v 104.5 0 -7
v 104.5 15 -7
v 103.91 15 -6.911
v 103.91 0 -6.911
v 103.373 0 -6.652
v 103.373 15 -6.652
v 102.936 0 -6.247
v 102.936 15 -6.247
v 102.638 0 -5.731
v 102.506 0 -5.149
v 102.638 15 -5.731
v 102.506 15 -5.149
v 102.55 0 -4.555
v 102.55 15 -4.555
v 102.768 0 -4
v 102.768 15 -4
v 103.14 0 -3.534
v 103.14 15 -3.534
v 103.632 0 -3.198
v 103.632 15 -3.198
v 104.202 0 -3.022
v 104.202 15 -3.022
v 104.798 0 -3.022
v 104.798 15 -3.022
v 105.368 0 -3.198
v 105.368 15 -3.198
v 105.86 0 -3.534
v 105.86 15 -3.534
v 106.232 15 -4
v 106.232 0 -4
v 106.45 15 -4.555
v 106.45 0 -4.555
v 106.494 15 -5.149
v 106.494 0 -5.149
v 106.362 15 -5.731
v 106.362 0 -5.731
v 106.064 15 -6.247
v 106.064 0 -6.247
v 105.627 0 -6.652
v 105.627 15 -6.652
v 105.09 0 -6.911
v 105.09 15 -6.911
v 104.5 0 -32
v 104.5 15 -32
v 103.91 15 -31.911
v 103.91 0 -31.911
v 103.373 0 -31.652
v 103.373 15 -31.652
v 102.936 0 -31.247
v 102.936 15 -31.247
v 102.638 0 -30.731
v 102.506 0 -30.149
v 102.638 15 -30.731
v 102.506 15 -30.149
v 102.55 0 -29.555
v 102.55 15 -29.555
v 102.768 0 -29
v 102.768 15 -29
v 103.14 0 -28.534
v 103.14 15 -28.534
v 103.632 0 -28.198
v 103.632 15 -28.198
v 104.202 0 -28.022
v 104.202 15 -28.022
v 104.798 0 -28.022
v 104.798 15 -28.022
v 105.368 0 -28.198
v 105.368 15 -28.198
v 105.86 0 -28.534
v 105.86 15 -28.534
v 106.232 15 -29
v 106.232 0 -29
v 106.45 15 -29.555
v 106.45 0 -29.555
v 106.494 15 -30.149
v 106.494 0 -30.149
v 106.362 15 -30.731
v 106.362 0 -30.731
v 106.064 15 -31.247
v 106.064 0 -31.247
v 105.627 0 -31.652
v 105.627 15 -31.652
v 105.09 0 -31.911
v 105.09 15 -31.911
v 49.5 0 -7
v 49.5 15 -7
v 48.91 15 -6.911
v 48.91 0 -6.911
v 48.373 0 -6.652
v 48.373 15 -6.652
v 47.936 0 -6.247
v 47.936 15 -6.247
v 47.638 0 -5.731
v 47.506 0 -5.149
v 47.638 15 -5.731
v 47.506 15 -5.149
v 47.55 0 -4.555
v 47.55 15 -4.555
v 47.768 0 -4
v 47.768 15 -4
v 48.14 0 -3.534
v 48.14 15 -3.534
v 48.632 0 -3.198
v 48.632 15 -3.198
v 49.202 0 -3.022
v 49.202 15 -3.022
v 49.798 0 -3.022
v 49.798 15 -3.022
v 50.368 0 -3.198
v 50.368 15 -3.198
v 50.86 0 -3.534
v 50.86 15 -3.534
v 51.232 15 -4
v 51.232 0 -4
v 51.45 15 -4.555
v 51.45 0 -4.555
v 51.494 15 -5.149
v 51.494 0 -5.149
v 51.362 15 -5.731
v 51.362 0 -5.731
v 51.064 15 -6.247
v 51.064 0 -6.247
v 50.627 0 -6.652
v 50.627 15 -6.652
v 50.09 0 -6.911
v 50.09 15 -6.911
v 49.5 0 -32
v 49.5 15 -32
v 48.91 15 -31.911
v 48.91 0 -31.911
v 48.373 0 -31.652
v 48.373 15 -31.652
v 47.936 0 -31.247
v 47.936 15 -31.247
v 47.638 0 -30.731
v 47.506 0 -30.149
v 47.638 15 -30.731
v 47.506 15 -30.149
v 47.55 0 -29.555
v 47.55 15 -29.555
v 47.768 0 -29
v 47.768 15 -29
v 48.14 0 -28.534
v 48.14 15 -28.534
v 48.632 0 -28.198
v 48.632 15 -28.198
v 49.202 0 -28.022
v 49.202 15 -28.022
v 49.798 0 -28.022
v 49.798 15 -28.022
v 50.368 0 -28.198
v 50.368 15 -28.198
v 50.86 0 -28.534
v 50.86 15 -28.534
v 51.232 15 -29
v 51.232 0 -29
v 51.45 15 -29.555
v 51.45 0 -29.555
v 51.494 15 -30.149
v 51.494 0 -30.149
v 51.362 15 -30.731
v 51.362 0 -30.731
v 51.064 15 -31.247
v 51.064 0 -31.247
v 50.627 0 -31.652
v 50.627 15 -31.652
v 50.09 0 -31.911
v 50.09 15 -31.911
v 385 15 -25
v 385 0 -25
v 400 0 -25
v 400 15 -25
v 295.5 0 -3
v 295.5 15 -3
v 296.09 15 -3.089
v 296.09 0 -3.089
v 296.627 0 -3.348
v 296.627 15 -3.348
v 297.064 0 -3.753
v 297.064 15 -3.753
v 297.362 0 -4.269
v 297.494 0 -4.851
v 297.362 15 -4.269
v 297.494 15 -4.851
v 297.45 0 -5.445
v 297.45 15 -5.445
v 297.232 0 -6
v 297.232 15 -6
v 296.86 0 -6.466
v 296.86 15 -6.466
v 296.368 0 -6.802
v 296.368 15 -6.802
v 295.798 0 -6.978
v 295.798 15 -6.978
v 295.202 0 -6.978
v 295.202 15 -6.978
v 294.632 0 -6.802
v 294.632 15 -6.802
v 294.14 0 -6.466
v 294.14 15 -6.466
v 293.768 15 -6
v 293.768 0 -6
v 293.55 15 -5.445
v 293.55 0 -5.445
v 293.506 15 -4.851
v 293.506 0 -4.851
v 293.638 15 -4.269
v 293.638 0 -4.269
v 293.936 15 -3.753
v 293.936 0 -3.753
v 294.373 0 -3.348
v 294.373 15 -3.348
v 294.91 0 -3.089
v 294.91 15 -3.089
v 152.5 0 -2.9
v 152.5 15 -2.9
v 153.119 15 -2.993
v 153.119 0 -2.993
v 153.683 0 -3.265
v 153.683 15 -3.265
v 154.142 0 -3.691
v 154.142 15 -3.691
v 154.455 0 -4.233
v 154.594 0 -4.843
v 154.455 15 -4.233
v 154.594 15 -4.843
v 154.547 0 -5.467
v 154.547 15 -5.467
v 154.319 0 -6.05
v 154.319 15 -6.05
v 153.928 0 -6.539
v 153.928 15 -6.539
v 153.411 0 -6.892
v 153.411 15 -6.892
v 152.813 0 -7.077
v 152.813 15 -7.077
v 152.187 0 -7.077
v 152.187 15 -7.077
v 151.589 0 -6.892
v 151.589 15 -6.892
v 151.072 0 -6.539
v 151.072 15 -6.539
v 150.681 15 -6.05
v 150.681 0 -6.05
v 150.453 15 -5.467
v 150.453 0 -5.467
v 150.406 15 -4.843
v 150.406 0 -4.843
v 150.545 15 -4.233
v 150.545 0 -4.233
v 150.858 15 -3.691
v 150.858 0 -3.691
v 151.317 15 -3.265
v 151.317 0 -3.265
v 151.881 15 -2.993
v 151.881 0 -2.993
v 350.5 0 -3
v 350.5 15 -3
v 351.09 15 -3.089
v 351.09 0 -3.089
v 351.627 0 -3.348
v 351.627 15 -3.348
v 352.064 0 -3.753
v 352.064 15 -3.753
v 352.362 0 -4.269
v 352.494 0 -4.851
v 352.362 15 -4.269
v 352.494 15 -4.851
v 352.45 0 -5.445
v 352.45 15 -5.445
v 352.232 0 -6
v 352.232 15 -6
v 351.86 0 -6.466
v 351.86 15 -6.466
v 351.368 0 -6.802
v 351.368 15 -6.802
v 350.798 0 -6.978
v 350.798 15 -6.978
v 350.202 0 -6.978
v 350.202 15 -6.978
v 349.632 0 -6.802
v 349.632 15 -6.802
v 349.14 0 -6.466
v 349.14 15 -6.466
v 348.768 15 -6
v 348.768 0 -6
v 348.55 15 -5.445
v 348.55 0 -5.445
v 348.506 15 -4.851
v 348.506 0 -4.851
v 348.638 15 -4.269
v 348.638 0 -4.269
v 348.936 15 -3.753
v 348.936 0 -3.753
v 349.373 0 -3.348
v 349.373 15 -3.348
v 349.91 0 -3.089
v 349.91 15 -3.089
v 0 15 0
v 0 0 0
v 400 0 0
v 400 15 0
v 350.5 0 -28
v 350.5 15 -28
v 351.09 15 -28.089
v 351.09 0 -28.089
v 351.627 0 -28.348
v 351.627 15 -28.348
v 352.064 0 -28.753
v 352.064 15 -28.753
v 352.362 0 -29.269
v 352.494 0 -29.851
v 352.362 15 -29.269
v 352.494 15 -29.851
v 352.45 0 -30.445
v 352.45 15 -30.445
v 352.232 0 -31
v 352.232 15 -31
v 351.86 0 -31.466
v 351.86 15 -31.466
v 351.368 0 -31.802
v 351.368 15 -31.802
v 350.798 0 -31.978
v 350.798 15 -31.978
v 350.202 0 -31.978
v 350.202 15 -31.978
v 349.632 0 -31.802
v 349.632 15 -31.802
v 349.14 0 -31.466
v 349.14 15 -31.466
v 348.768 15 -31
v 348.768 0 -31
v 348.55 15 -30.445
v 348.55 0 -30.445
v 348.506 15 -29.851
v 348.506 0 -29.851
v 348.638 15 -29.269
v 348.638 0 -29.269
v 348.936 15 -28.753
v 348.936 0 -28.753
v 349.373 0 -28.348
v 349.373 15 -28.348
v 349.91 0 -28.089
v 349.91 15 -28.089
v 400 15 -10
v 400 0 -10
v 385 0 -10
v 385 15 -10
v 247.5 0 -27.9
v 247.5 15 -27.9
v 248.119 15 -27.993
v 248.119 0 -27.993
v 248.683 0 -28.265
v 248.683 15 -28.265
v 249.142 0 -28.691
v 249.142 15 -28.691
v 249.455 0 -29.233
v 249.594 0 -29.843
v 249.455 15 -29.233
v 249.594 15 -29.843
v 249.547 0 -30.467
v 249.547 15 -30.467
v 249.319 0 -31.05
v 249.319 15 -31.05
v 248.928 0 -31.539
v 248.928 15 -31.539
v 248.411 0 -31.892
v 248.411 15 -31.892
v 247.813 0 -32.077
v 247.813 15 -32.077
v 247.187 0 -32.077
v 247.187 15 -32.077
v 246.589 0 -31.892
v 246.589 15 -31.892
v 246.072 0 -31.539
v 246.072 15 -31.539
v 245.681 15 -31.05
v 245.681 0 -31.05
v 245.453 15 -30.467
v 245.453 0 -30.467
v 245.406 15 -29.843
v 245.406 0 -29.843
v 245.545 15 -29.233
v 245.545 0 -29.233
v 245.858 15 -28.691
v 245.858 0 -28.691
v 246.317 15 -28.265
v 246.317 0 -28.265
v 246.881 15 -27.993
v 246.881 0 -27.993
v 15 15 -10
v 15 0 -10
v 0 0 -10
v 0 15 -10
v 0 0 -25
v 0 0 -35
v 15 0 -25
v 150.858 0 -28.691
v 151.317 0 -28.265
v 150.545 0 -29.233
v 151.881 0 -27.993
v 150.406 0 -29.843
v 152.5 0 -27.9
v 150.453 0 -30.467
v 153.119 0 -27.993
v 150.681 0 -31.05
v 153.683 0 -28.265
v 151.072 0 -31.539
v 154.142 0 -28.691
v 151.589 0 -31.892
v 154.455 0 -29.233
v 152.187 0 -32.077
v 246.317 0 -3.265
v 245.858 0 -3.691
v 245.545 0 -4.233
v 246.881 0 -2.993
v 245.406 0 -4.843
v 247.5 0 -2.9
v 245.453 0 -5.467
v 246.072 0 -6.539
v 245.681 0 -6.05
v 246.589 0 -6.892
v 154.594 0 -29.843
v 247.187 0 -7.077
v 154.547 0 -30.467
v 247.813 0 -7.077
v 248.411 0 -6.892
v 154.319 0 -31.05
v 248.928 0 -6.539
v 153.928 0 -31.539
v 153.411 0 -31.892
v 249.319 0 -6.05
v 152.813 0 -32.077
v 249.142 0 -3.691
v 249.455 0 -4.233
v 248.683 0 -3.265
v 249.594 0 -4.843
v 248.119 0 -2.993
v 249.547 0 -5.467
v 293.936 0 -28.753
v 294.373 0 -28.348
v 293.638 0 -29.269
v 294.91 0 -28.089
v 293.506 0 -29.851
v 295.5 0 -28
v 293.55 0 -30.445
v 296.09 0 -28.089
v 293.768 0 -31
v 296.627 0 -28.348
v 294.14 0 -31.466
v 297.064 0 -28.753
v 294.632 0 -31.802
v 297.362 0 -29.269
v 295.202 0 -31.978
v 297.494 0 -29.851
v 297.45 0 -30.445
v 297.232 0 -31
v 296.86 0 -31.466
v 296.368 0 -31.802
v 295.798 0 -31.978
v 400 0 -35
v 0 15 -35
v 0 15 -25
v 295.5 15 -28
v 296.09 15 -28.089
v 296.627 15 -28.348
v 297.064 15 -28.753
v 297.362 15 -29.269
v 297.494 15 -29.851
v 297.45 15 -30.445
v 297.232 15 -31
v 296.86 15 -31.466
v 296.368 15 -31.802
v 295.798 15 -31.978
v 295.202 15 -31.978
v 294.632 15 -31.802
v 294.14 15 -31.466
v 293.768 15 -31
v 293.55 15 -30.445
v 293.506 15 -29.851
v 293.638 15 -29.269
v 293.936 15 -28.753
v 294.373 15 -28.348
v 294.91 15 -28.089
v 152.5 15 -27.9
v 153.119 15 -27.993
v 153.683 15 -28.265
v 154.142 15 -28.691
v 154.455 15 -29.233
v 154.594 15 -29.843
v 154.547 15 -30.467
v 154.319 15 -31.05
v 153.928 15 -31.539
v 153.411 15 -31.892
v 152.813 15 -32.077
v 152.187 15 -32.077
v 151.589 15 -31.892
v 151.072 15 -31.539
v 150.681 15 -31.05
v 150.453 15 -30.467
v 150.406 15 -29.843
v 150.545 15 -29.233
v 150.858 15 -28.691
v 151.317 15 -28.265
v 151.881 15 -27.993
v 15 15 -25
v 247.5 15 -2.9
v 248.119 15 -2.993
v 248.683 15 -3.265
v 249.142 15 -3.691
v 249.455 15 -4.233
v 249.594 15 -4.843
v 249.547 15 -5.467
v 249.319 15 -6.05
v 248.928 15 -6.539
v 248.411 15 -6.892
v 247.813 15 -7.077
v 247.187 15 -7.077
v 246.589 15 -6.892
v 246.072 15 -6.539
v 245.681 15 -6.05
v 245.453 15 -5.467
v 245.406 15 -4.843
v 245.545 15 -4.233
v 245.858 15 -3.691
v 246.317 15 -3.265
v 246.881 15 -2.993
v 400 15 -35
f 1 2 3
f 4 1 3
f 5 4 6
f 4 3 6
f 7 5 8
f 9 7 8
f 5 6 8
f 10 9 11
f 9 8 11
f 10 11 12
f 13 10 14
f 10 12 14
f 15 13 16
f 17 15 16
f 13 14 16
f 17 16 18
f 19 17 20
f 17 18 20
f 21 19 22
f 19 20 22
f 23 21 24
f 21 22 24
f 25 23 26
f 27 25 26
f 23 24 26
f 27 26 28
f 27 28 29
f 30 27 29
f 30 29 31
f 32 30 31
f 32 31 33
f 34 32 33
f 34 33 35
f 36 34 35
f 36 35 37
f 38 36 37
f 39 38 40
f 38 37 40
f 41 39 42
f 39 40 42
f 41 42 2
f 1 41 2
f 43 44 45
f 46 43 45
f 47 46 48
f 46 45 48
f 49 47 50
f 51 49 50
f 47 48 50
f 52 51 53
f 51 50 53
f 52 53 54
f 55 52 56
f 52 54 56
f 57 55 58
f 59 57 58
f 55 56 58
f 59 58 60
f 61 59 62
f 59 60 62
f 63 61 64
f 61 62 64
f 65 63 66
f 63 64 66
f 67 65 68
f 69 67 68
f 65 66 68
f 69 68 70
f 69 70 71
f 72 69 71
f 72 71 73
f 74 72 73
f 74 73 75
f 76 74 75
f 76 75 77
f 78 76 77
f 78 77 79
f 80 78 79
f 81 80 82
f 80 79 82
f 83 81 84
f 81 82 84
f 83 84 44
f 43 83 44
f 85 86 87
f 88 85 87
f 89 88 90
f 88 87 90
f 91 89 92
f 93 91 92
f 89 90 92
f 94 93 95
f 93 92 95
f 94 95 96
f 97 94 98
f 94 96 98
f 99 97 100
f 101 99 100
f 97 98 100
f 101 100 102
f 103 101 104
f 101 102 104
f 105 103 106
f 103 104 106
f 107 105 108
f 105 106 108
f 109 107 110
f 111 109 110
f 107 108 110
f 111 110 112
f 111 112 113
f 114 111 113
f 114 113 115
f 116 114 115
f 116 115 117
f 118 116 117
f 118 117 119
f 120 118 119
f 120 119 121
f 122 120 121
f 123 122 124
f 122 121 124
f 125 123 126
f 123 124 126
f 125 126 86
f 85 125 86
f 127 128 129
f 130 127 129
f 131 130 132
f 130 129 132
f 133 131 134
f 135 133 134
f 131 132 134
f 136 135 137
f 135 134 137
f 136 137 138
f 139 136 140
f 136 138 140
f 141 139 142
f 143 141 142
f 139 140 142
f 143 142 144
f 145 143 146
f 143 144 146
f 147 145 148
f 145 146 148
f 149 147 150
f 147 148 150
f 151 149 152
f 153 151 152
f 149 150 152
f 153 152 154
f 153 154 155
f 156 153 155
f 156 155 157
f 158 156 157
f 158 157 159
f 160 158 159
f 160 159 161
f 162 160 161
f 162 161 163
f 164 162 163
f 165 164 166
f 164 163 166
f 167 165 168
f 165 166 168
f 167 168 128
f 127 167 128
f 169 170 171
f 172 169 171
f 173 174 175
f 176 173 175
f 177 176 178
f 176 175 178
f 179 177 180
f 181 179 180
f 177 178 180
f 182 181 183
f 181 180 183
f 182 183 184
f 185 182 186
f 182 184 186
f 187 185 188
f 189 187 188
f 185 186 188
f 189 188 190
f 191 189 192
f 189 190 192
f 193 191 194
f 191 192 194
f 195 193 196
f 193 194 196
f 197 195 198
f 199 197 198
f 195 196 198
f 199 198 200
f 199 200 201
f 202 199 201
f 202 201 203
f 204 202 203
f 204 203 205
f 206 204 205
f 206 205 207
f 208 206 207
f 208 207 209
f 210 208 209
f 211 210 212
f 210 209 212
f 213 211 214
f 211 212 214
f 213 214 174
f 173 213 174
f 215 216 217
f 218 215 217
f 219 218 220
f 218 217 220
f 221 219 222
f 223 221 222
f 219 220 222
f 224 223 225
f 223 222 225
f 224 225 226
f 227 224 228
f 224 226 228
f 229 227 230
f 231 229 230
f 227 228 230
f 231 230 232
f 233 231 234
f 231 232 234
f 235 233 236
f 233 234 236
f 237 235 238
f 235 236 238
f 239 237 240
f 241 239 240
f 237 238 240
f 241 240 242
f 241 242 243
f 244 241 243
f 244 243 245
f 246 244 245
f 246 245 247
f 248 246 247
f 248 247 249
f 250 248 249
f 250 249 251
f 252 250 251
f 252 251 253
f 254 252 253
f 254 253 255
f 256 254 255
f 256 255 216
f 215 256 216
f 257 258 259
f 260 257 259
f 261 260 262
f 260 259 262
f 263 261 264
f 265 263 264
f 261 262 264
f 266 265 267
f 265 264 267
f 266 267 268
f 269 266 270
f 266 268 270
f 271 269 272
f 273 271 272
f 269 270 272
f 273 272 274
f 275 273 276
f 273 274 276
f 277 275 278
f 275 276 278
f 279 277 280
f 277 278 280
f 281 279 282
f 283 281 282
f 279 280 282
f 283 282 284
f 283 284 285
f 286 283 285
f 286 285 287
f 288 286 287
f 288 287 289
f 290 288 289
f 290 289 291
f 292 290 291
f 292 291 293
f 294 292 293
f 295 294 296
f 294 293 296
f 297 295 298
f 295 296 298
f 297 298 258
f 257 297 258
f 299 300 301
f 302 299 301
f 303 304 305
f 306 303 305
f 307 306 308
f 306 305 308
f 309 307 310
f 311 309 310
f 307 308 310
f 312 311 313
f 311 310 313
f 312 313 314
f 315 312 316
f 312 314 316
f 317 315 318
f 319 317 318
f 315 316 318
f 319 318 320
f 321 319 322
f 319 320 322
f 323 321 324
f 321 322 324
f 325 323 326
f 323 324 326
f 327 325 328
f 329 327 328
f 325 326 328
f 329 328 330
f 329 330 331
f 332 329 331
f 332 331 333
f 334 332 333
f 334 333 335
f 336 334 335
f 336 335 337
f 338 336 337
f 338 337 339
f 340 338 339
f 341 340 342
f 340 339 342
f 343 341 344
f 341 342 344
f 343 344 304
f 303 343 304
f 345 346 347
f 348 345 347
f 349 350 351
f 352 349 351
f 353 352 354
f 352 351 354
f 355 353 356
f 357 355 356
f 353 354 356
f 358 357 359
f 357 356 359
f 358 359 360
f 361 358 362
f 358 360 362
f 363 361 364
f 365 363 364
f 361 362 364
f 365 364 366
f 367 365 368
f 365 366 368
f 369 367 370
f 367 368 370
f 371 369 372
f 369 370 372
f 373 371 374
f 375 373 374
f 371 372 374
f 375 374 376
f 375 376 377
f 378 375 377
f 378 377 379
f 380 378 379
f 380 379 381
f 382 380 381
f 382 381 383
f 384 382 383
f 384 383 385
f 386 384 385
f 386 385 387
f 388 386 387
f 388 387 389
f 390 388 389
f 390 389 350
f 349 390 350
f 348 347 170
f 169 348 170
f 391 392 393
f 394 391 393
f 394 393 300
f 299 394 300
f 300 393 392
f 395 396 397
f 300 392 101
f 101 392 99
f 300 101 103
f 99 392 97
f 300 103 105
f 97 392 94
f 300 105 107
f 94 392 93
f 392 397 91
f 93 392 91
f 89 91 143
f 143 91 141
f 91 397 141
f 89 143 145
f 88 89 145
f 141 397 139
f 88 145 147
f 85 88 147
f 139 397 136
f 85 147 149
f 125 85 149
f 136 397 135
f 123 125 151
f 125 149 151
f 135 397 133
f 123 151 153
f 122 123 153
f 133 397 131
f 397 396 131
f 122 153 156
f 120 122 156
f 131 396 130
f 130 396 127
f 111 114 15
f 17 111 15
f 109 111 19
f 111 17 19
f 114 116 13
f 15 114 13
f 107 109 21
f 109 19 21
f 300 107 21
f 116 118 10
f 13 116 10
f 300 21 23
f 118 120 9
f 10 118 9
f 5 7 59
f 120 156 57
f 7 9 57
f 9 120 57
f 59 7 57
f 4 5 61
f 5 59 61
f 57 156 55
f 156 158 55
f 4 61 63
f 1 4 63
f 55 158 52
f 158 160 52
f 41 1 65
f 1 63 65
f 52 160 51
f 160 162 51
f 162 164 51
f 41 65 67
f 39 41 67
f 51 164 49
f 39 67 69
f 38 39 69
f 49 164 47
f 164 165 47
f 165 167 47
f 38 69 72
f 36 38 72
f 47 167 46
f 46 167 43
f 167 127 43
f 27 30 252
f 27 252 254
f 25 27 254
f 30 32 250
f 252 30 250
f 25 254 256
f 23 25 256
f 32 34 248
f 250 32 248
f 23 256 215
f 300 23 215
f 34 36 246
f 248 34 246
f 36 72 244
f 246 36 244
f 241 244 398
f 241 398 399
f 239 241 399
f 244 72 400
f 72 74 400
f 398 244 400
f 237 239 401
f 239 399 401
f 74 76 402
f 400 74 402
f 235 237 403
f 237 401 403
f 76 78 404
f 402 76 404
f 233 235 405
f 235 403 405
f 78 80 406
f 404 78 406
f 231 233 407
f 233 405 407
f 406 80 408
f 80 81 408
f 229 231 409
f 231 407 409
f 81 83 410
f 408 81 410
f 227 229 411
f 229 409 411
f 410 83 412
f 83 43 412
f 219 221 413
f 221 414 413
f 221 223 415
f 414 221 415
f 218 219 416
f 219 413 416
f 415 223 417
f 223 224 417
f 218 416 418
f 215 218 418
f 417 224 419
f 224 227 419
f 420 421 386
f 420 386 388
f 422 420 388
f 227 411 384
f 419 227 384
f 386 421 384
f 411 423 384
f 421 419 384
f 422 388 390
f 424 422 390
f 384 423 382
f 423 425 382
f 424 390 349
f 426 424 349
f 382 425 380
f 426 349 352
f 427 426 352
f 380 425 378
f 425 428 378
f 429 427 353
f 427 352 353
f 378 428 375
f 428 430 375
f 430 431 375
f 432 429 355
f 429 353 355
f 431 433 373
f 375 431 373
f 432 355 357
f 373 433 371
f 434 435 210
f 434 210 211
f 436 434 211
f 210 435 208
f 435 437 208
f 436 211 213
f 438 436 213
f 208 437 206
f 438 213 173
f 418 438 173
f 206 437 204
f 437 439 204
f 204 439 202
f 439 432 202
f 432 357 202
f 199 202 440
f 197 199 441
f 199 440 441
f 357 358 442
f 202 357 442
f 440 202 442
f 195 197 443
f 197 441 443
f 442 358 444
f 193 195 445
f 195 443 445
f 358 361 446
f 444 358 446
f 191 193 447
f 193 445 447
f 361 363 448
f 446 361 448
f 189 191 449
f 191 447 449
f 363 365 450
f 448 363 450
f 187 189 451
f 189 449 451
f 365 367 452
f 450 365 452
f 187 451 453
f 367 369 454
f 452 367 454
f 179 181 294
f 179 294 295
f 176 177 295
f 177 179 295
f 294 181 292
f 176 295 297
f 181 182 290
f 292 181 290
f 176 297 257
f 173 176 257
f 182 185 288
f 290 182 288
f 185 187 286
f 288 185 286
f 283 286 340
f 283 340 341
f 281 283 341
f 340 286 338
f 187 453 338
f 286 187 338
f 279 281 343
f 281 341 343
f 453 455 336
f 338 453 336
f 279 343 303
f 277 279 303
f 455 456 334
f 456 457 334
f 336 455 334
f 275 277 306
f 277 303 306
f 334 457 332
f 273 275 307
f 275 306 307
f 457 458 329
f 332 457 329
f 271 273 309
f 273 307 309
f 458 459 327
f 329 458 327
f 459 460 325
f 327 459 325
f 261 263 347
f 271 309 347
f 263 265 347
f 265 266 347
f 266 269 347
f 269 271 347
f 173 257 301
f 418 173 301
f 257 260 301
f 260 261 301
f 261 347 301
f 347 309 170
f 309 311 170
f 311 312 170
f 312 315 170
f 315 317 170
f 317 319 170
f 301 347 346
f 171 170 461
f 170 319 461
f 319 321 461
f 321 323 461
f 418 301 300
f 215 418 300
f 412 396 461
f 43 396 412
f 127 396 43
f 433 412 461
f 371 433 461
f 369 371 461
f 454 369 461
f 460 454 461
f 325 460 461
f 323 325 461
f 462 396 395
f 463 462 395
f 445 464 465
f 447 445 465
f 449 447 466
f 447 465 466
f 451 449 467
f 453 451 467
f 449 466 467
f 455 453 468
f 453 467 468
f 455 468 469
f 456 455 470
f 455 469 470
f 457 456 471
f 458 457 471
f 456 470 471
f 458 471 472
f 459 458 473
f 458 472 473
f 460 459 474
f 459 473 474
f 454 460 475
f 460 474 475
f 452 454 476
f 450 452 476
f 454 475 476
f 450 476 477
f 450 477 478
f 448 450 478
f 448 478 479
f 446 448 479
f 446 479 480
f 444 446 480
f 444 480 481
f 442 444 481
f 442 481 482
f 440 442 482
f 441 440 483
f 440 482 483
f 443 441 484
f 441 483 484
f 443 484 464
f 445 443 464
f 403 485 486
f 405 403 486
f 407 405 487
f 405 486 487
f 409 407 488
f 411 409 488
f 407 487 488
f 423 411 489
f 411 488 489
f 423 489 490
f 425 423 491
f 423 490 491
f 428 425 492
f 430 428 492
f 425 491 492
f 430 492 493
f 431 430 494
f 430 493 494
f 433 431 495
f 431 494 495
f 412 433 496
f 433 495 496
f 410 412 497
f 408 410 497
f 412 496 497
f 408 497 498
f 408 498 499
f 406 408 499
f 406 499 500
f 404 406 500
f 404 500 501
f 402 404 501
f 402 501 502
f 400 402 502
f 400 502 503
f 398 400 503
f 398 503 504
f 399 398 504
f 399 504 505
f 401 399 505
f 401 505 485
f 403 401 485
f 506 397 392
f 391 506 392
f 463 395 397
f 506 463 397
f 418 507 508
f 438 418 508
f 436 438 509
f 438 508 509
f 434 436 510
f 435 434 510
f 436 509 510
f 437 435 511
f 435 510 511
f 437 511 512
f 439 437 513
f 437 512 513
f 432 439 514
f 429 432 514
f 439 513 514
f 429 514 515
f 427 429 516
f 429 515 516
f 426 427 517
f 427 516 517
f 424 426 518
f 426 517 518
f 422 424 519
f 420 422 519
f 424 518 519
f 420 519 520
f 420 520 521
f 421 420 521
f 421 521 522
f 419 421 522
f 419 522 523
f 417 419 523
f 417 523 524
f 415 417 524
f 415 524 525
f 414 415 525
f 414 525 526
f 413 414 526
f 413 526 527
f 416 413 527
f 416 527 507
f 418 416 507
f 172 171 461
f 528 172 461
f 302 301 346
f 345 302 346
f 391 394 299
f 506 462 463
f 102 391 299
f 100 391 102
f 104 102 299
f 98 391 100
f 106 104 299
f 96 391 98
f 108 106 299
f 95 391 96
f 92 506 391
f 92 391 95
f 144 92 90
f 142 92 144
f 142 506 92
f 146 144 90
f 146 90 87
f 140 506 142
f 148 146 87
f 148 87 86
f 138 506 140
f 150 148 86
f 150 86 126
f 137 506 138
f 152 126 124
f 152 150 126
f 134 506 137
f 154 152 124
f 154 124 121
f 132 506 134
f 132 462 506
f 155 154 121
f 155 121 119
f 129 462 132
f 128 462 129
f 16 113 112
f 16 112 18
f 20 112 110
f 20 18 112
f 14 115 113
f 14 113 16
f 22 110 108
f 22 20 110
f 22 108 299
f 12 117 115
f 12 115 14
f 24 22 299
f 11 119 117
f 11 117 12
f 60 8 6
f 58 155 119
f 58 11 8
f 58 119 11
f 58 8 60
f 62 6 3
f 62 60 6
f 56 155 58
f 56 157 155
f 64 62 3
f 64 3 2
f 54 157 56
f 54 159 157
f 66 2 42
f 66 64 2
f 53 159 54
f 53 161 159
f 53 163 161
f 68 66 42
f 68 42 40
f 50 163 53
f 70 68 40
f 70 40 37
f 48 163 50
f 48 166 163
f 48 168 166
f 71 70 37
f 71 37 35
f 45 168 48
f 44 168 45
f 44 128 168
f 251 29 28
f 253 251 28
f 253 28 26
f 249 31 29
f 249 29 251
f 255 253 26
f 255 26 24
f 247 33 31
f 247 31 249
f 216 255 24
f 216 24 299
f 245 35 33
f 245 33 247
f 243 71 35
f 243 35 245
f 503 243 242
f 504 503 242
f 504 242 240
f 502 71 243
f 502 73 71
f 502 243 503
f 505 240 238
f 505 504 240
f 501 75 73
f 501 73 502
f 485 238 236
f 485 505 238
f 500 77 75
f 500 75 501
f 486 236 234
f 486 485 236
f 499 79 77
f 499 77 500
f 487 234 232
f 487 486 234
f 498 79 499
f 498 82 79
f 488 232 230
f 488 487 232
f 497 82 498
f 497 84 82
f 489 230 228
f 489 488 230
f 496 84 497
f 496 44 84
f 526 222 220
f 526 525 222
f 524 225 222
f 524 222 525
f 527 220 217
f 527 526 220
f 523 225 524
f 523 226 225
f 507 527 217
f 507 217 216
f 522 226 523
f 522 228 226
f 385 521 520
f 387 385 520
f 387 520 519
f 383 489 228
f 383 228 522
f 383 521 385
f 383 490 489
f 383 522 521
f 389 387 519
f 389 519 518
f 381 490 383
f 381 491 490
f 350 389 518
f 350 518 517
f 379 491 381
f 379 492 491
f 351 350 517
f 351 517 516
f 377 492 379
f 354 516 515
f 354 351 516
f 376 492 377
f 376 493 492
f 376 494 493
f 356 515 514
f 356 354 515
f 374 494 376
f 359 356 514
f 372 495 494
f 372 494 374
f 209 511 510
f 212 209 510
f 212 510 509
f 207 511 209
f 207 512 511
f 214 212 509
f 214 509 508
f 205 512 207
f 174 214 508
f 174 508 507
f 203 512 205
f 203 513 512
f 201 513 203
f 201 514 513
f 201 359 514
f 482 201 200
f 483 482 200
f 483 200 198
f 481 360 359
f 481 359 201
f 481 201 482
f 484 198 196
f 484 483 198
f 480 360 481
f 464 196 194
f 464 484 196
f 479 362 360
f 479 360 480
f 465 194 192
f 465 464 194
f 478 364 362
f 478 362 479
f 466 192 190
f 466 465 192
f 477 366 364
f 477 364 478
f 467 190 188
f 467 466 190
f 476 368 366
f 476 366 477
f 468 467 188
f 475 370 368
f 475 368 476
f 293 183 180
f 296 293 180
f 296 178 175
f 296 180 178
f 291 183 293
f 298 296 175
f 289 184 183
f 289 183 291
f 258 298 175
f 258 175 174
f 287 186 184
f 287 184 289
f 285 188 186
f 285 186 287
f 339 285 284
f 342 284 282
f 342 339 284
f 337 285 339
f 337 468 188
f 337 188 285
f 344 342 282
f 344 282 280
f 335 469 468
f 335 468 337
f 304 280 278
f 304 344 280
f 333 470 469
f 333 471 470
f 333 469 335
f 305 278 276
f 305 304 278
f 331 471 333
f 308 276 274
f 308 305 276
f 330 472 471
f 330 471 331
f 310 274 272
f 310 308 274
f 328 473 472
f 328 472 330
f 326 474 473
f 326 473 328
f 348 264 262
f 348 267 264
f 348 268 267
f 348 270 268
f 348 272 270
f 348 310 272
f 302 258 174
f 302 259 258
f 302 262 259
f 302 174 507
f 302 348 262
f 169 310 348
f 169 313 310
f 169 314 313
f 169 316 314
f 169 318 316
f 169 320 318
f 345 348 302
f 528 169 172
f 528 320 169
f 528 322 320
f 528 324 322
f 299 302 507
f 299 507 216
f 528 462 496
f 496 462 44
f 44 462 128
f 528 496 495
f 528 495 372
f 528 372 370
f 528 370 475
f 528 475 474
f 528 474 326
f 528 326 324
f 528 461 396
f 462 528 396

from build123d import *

# Parameters (mm, degrees)
EXTRUDE_1_DEPTH     = 15
SKETCH_5_R          = 2.1
CUT_EXTRUDE_2_DEPTH = 30
SKETCH_6_R          = 2
CUT_EXTRUDE_3_DEPTH = 15


with BuildPart() as part:
    # 草图3 → 凸台-拉伸1 (new body)
    with BuildSketch(Plane(origin=(0, 0, 0), x_dir=(1, 0, 0), z_dir=(0, 1, 0))):
        Polygon((0, 0), (400, 0), (400, 10), (385, 10), (385, 25), (400, 25), (400, 35), (0, 35), (0, 25), (15, 25), (15, 10), (0, 10), align=None)
    extrude(amount=EXTRUDE_1_DEPTH)

    # 草图5 → 切除-拉伸2 (cut)
    with BuildSketch(Plane(origin=(0, 15, 0), x_dir=(1, 0, 0), z_dir=(0, 1, 0))):
        with Locations(Location((152.5, 5, 0), (0, 0, 270))):
            Circle(SKETCH_5_R)
        with Locations(Location((152.5, 30, 0), (0, 0, 270))):
            Circle(SKETCH_5_R)
        with Locations(Location((247.5, 5, 0), (0, 0, 270))):
            Circle(SKETCH_5_R)
        with Locations(Location((247.5, 30, 0), (0, 0, 270))):
            Circle(SKETCH_5_R)
    extrude(amount=-CUT_EXTRUDE_2_DEPTH, mode=Mode.SUBTRACT)

    # 草图6 → 切除-拉伸3 (cut)
    with BuildSketch(Plane(origin=(0, 15, 0), x_dir=(1, 0, 0), z_dir=(0, 1, 0))):
        with Locations(Location((350.5, 5, 0), (0, 0, 270))):
            Circle(SKETCH_6_R)
        with Locations(Location((295.5, 5, 0), (0, 0, 270))):
            Circle(SKETCH_6_R)
        with Locations(Location((350.5, 30, 0), (0, 0, 270))):
            Circle(SKETCH_6_R)
        with Locations(Location((295.5, 30, 0), (0, 0, 270))):
            Circle(SKETCH_6_R)
        with Locations(Location((49.5, 30, 0), (0, 0, 90))):
            Circle(SKETCH_6_R)
        with Locations(Location((104.5, 30, 0), (0, 0, 90))):
            Circle(SKETCH_6_R)
        with Locations(Location((104.5, 5, 0), (0, 0, 90))):
            Circle(SKETCH_6_R)
        with Locations(Location((49.5, 5, 0), (0, 0, 90))):
            Circle(SKETCH_6_R)
    extrude(amount=-CUT_EXTRUDE_3_DEPTH, mode=Mode.SUBTRACT)


solid = part.part
